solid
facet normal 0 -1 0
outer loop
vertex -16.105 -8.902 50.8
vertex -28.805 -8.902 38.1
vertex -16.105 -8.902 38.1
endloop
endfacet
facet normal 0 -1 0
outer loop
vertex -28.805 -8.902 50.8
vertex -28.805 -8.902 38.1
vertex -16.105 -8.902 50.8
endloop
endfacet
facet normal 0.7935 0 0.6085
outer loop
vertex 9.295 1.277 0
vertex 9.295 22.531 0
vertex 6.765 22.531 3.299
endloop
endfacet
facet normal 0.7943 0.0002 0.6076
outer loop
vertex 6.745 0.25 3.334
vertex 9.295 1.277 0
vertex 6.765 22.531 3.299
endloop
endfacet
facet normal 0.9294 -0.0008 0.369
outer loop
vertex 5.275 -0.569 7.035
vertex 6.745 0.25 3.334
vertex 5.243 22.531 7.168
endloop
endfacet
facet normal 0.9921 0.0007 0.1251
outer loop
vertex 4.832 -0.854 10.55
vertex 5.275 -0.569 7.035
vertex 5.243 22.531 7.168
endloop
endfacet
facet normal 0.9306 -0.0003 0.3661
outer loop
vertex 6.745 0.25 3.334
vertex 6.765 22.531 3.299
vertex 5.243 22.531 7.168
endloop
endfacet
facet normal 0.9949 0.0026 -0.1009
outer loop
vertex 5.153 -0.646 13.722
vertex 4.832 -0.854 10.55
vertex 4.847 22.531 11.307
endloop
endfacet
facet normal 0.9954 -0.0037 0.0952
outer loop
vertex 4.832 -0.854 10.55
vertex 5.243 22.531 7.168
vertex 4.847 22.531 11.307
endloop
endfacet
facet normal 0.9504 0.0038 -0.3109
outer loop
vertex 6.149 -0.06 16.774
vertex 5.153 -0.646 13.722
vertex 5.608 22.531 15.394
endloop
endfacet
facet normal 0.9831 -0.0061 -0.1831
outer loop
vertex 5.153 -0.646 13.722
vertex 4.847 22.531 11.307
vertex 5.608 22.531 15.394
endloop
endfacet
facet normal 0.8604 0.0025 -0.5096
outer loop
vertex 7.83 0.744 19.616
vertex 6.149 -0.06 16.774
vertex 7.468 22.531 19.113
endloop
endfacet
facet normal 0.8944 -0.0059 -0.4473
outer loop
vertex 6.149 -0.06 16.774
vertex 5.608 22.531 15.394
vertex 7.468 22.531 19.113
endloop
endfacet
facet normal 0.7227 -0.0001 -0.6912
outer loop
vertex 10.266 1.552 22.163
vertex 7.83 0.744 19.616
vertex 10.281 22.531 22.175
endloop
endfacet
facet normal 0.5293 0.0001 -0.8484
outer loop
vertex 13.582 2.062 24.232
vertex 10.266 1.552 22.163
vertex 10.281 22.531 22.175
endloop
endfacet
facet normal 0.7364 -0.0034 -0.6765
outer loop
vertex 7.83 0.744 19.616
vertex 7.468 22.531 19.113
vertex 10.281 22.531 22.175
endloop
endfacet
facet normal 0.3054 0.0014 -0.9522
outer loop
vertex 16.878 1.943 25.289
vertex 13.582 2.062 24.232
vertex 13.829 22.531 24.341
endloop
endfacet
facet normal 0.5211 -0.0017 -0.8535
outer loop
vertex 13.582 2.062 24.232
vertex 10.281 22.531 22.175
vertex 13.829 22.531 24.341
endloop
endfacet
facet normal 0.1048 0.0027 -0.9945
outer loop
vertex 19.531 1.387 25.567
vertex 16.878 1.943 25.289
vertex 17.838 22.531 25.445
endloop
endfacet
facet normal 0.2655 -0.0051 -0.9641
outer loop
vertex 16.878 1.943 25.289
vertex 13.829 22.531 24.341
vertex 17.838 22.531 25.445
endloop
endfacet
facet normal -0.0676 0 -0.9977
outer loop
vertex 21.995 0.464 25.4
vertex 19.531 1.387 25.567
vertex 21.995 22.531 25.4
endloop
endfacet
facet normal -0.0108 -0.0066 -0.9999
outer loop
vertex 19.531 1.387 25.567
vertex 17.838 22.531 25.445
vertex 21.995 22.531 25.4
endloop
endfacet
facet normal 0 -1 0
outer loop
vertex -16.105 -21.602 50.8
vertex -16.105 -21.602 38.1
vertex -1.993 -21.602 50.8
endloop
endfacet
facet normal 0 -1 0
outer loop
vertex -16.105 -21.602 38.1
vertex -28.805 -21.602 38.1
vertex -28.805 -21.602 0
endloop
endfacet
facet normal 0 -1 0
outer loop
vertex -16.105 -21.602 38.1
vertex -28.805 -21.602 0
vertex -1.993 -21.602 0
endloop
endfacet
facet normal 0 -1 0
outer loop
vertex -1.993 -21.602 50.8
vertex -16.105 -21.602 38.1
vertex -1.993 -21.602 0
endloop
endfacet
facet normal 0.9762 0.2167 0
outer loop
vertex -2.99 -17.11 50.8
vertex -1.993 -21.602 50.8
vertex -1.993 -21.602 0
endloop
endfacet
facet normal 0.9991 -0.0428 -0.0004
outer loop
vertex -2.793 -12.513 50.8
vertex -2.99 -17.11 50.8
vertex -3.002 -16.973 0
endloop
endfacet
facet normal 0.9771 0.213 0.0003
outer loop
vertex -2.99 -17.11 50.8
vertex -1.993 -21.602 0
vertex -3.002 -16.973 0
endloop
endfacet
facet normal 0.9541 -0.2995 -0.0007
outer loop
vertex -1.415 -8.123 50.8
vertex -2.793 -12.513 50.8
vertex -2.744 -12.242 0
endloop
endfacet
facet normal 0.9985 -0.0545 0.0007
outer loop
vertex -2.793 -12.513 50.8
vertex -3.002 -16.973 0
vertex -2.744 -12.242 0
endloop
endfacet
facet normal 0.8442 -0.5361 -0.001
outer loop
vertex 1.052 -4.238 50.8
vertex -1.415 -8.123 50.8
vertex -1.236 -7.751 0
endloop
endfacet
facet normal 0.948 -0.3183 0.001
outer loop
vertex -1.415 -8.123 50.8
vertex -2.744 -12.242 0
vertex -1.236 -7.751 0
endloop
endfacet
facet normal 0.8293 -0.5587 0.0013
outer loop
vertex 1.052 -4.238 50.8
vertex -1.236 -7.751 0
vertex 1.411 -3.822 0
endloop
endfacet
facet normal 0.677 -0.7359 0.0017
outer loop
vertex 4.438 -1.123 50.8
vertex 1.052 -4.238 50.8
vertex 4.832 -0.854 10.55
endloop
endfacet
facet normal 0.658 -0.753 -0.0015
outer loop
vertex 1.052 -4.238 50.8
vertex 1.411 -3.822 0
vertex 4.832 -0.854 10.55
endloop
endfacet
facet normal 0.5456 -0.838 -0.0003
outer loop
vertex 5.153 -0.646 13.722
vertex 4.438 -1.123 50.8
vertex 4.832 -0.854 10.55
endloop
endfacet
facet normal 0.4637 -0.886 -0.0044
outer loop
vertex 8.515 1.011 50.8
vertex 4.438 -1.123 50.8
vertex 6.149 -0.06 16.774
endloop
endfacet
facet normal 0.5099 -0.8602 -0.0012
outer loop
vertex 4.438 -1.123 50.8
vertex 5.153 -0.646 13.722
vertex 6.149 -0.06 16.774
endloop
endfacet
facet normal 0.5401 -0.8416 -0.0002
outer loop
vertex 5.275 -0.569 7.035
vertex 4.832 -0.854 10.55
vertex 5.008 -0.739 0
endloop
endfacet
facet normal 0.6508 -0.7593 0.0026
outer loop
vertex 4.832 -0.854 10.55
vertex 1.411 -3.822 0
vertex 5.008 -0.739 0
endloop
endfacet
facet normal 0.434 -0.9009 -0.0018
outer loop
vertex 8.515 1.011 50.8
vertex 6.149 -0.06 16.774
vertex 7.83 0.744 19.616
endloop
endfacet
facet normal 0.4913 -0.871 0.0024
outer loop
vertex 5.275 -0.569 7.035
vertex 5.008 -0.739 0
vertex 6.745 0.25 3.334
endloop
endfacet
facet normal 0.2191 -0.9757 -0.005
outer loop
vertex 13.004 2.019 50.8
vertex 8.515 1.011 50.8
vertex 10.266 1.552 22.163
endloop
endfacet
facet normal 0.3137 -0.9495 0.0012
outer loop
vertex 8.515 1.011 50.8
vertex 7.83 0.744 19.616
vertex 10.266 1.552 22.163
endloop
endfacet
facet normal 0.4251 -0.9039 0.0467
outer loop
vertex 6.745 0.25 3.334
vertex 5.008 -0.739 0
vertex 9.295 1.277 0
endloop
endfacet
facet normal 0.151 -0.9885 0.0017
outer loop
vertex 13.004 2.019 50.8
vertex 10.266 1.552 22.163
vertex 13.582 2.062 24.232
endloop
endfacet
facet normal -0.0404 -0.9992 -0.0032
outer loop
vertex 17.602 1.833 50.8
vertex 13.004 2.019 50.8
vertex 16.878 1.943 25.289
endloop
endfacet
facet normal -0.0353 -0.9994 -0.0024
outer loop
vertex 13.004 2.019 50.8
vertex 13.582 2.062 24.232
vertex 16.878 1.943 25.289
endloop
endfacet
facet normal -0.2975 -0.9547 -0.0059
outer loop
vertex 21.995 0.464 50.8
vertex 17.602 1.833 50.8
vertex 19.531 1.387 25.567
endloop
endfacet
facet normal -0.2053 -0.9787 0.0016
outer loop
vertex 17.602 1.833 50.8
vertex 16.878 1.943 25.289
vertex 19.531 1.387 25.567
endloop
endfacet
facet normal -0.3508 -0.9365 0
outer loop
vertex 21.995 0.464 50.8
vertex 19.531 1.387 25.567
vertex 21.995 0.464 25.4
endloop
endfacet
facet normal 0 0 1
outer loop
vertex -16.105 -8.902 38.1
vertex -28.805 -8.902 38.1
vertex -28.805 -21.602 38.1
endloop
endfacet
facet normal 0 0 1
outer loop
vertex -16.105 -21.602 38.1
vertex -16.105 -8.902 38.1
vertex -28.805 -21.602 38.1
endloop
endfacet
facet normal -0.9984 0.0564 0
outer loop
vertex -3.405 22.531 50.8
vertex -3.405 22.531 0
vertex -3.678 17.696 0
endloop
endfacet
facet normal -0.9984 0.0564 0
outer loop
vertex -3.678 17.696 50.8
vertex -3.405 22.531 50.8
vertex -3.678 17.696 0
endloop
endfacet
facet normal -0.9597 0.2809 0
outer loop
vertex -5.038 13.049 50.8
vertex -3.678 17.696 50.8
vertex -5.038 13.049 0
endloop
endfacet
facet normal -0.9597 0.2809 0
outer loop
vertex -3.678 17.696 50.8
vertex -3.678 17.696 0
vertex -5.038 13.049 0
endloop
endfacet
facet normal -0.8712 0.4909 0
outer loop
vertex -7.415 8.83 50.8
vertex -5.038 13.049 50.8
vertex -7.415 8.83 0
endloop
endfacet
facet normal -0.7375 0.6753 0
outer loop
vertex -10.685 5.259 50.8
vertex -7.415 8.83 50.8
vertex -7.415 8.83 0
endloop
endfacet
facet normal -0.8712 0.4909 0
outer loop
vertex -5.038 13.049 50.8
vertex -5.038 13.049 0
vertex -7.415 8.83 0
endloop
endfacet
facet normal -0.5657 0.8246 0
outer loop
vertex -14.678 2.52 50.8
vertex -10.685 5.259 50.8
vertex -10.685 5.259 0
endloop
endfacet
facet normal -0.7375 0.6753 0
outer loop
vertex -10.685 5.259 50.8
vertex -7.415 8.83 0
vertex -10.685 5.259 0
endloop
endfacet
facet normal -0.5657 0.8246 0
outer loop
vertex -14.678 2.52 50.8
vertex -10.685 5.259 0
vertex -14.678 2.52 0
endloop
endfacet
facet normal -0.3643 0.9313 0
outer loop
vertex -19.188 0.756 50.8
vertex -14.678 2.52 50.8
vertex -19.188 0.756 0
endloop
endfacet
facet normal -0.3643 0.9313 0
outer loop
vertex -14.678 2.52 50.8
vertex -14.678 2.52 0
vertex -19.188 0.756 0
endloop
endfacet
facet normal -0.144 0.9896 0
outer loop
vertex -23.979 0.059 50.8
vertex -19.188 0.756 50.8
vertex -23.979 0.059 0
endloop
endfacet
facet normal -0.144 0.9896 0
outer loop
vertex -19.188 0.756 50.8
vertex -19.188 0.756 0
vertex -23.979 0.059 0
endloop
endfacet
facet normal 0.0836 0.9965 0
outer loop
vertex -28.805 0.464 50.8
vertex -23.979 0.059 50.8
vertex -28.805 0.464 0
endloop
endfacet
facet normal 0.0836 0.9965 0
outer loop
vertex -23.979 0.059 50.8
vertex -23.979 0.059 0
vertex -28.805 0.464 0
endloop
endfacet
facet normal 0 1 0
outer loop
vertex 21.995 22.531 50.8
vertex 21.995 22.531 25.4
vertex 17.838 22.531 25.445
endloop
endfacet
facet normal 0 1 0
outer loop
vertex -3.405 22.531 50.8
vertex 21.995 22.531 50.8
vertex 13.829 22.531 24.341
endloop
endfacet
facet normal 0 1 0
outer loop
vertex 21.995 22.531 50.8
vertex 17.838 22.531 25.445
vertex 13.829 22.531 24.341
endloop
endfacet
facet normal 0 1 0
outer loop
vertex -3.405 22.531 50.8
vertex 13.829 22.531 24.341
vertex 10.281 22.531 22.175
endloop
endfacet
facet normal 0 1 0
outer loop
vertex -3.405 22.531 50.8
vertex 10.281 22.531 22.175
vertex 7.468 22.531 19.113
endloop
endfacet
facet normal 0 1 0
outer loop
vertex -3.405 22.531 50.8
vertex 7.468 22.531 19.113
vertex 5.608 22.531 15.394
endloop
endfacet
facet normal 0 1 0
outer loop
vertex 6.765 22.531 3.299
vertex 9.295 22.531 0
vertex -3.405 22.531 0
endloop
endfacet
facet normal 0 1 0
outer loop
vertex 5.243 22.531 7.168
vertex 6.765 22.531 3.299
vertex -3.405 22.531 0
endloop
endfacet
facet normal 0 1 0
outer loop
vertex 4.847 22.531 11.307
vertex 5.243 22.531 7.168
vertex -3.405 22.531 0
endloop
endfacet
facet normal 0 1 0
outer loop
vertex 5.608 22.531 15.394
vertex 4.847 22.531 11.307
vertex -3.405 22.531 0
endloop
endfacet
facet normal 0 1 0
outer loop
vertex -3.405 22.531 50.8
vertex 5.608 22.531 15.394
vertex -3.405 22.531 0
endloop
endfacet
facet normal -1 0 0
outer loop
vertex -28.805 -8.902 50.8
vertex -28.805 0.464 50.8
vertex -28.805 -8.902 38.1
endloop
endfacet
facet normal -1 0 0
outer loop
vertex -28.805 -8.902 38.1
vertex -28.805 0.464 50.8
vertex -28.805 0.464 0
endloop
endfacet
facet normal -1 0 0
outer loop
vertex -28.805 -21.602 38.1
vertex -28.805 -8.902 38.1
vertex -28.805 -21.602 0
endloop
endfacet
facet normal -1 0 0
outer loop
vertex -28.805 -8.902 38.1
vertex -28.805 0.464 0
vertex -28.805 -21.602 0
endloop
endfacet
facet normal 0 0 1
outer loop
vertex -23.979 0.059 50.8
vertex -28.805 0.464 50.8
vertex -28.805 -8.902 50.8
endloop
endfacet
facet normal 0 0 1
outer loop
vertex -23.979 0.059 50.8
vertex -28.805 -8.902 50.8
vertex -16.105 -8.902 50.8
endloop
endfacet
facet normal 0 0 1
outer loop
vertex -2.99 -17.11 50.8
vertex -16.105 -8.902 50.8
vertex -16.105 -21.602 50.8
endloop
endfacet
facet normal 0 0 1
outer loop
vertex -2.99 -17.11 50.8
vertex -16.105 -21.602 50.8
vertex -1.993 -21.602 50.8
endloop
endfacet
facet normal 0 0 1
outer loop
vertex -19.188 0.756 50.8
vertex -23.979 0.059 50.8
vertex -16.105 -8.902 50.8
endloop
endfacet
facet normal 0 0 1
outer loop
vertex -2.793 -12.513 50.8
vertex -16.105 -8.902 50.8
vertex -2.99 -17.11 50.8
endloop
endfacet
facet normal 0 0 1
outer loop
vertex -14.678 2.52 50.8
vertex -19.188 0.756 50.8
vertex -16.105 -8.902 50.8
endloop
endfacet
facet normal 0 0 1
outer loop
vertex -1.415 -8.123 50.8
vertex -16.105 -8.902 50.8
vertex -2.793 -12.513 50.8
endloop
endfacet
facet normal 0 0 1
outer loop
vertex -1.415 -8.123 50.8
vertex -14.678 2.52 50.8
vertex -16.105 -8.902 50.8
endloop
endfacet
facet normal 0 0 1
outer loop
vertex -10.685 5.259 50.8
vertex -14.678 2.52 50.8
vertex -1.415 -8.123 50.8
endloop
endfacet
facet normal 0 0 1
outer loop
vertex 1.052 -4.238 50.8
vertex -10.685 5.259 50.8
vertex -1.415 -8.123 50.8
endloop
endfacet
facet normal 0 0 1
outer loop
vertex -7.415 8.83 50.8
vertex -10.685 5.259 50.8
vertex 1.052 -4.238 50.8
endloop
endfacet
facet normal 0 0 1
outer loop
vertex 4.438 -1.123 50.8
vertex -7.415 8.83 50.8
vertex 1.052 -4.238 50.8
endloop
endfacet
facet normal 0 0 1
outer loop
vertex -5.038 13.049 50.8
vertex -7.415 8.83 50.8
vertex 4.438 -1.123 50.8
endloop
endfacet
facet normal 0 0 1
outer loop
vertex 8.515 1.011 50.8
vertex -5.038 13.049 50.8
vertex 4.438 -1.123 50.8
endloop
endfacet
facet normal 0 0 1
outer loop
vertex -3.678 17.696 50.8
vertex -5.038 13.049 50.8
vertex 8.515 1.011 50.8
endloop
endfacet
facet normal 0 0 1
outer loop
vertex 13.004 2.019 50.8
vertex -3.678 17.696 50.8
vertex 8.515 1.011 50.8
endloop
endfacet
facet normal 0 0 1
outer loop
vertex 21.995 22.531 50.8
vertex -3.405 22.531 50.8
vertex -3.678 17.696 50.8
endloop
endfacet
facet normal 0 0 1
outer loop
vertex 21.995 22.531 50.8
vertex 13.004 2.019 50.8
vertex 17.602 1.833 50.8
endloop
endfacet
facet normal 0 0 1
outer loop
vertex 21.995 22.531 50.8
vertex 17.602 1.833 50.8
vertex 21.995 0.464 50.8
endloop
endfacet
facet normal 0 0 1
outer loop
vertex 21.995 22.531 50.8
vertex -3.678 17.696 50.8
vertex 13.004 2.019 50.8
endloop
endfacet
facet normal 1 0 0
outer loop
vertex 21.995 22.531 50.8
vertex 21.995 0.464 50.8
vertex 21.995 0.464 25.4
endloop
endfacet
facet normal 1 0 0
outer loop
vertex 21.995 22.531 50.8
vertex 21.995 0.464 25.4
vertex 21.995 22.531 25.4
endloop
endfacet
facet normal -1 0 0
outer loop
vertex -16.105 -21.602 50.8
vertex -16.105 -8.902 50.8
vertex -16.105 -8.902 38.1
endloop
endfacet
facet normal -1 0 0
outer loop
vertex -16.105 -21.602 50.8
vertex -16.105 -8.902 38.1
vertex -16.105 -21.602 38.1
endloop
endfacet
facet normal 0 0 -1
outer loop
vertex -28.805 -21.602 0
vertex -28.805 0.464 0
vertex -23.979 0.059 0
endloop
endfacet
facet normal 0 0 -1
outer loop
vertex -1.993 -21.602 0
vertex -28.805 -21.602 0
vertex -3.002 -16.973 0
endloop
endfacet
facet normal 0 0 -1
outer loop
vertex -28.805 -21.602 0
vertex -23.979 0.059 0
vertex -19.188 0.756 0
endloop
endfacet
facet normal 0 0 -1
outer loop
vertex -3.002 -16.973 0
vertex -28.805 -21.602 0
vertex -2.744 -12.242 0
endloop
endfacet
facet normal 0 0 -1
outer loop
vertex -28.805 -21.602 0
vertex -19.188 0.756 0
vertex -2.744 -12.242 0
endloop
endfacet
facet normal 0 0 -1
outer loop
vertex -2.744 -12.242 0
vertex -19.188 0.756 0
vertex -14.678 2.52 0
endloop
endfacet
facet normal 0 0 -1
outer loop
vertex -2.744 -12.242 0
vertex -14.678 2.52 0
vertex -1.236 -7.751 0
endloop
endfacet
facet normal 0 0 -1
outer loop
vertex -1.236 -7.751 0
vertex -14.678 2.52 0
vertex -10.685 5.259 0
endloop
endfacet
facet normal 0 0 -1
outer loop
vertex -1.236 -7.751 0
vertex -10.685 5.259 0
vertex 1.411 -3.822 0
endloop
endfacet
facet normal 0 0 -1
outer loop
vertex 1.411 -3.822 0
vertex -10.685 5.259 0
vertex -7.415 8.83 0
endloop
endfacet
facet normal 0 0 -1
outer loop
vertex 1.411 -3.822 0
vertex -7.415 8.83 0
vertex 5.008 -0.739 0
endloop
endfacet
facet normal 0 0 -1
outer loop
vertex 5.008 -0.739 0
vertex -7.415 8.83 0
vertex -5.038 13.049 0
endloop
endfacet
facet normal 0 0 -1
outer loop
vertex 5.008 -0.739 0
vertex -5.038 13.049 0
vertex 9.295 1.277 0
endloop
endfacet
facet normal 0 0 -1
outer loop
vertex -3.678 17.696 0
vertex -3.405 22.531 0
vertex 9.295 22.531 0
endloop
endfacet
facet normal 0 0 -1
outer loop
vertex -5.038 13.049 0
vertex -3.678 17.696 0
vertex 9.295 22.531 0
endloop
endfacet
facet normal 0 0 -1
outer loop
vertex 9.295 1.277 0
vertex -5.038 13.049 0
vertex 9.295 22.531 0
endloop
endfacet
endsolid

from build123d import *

# Parameters (mm, degrees)
F1_DEPTH = 50.8
F2_W     = 12.7
F2_H     = 12.7
F3_DEPTH = 12.7
F5_DEPTH = 25.4


with BuildPart() as f1:
    # F0 (on Top) → F1 (new body)
    with BuildSketch(Plane.XY):
        with BuildLine():
            Line((21.995319, 22.530525), (-3.404681, 22.530525))
            ThreePointArc((-3.404681, 22.530525), (-10.684751, 5.258633), (-28.804681, 0.464275))
            Line((-28.804681, 0.464275), (-28.804681, -21.601974))
            Line((-28.804681, -21.601974), (-1.992511, -21.601974))
            ThreePointArc((-1.992511, -21.601974), (2.643049, -2.569712), (21.995319, 0.464275))
            Line((21.995319, 0.464275), (21.995319, 22.530525))
        make_face()
    extrude(amount=F1_DEPTH)

    # F2 (on face) → F3 (cut)
    with BuildSketch(Plane(origin=(-28.804681, 0, 0), x_dir=(0, -1, 0), z_dir=(-1, 0, 0))):
        with Locations((15.251974, 44.45)):
            Rectangle(F2_W, F2_H)
    extrude(amount=-F3_DEPTH, mode=Mode.SUBTRACT)

    # F4 (on face) → F5 (cut)
    with BuildSketch(Plane(origin=(0, 22.530525, 0), x_dir=(-1, 0, 0), z_dir=(0, 1, 0))):
        with BuildLine():
            Line((-21.995319, 0), (-9.295319, 0))
            ThreePointArc((-9.295319, 0), (-6.407691, 17.318814), (-21.995319, 25.4))
            Line((-21.995319, 25.4), (-21.995319, 0))
        make_face()
    extrude(amount=-F5_DEPTH, mode=Mode.SUBTRACT)


solid = f1.part
